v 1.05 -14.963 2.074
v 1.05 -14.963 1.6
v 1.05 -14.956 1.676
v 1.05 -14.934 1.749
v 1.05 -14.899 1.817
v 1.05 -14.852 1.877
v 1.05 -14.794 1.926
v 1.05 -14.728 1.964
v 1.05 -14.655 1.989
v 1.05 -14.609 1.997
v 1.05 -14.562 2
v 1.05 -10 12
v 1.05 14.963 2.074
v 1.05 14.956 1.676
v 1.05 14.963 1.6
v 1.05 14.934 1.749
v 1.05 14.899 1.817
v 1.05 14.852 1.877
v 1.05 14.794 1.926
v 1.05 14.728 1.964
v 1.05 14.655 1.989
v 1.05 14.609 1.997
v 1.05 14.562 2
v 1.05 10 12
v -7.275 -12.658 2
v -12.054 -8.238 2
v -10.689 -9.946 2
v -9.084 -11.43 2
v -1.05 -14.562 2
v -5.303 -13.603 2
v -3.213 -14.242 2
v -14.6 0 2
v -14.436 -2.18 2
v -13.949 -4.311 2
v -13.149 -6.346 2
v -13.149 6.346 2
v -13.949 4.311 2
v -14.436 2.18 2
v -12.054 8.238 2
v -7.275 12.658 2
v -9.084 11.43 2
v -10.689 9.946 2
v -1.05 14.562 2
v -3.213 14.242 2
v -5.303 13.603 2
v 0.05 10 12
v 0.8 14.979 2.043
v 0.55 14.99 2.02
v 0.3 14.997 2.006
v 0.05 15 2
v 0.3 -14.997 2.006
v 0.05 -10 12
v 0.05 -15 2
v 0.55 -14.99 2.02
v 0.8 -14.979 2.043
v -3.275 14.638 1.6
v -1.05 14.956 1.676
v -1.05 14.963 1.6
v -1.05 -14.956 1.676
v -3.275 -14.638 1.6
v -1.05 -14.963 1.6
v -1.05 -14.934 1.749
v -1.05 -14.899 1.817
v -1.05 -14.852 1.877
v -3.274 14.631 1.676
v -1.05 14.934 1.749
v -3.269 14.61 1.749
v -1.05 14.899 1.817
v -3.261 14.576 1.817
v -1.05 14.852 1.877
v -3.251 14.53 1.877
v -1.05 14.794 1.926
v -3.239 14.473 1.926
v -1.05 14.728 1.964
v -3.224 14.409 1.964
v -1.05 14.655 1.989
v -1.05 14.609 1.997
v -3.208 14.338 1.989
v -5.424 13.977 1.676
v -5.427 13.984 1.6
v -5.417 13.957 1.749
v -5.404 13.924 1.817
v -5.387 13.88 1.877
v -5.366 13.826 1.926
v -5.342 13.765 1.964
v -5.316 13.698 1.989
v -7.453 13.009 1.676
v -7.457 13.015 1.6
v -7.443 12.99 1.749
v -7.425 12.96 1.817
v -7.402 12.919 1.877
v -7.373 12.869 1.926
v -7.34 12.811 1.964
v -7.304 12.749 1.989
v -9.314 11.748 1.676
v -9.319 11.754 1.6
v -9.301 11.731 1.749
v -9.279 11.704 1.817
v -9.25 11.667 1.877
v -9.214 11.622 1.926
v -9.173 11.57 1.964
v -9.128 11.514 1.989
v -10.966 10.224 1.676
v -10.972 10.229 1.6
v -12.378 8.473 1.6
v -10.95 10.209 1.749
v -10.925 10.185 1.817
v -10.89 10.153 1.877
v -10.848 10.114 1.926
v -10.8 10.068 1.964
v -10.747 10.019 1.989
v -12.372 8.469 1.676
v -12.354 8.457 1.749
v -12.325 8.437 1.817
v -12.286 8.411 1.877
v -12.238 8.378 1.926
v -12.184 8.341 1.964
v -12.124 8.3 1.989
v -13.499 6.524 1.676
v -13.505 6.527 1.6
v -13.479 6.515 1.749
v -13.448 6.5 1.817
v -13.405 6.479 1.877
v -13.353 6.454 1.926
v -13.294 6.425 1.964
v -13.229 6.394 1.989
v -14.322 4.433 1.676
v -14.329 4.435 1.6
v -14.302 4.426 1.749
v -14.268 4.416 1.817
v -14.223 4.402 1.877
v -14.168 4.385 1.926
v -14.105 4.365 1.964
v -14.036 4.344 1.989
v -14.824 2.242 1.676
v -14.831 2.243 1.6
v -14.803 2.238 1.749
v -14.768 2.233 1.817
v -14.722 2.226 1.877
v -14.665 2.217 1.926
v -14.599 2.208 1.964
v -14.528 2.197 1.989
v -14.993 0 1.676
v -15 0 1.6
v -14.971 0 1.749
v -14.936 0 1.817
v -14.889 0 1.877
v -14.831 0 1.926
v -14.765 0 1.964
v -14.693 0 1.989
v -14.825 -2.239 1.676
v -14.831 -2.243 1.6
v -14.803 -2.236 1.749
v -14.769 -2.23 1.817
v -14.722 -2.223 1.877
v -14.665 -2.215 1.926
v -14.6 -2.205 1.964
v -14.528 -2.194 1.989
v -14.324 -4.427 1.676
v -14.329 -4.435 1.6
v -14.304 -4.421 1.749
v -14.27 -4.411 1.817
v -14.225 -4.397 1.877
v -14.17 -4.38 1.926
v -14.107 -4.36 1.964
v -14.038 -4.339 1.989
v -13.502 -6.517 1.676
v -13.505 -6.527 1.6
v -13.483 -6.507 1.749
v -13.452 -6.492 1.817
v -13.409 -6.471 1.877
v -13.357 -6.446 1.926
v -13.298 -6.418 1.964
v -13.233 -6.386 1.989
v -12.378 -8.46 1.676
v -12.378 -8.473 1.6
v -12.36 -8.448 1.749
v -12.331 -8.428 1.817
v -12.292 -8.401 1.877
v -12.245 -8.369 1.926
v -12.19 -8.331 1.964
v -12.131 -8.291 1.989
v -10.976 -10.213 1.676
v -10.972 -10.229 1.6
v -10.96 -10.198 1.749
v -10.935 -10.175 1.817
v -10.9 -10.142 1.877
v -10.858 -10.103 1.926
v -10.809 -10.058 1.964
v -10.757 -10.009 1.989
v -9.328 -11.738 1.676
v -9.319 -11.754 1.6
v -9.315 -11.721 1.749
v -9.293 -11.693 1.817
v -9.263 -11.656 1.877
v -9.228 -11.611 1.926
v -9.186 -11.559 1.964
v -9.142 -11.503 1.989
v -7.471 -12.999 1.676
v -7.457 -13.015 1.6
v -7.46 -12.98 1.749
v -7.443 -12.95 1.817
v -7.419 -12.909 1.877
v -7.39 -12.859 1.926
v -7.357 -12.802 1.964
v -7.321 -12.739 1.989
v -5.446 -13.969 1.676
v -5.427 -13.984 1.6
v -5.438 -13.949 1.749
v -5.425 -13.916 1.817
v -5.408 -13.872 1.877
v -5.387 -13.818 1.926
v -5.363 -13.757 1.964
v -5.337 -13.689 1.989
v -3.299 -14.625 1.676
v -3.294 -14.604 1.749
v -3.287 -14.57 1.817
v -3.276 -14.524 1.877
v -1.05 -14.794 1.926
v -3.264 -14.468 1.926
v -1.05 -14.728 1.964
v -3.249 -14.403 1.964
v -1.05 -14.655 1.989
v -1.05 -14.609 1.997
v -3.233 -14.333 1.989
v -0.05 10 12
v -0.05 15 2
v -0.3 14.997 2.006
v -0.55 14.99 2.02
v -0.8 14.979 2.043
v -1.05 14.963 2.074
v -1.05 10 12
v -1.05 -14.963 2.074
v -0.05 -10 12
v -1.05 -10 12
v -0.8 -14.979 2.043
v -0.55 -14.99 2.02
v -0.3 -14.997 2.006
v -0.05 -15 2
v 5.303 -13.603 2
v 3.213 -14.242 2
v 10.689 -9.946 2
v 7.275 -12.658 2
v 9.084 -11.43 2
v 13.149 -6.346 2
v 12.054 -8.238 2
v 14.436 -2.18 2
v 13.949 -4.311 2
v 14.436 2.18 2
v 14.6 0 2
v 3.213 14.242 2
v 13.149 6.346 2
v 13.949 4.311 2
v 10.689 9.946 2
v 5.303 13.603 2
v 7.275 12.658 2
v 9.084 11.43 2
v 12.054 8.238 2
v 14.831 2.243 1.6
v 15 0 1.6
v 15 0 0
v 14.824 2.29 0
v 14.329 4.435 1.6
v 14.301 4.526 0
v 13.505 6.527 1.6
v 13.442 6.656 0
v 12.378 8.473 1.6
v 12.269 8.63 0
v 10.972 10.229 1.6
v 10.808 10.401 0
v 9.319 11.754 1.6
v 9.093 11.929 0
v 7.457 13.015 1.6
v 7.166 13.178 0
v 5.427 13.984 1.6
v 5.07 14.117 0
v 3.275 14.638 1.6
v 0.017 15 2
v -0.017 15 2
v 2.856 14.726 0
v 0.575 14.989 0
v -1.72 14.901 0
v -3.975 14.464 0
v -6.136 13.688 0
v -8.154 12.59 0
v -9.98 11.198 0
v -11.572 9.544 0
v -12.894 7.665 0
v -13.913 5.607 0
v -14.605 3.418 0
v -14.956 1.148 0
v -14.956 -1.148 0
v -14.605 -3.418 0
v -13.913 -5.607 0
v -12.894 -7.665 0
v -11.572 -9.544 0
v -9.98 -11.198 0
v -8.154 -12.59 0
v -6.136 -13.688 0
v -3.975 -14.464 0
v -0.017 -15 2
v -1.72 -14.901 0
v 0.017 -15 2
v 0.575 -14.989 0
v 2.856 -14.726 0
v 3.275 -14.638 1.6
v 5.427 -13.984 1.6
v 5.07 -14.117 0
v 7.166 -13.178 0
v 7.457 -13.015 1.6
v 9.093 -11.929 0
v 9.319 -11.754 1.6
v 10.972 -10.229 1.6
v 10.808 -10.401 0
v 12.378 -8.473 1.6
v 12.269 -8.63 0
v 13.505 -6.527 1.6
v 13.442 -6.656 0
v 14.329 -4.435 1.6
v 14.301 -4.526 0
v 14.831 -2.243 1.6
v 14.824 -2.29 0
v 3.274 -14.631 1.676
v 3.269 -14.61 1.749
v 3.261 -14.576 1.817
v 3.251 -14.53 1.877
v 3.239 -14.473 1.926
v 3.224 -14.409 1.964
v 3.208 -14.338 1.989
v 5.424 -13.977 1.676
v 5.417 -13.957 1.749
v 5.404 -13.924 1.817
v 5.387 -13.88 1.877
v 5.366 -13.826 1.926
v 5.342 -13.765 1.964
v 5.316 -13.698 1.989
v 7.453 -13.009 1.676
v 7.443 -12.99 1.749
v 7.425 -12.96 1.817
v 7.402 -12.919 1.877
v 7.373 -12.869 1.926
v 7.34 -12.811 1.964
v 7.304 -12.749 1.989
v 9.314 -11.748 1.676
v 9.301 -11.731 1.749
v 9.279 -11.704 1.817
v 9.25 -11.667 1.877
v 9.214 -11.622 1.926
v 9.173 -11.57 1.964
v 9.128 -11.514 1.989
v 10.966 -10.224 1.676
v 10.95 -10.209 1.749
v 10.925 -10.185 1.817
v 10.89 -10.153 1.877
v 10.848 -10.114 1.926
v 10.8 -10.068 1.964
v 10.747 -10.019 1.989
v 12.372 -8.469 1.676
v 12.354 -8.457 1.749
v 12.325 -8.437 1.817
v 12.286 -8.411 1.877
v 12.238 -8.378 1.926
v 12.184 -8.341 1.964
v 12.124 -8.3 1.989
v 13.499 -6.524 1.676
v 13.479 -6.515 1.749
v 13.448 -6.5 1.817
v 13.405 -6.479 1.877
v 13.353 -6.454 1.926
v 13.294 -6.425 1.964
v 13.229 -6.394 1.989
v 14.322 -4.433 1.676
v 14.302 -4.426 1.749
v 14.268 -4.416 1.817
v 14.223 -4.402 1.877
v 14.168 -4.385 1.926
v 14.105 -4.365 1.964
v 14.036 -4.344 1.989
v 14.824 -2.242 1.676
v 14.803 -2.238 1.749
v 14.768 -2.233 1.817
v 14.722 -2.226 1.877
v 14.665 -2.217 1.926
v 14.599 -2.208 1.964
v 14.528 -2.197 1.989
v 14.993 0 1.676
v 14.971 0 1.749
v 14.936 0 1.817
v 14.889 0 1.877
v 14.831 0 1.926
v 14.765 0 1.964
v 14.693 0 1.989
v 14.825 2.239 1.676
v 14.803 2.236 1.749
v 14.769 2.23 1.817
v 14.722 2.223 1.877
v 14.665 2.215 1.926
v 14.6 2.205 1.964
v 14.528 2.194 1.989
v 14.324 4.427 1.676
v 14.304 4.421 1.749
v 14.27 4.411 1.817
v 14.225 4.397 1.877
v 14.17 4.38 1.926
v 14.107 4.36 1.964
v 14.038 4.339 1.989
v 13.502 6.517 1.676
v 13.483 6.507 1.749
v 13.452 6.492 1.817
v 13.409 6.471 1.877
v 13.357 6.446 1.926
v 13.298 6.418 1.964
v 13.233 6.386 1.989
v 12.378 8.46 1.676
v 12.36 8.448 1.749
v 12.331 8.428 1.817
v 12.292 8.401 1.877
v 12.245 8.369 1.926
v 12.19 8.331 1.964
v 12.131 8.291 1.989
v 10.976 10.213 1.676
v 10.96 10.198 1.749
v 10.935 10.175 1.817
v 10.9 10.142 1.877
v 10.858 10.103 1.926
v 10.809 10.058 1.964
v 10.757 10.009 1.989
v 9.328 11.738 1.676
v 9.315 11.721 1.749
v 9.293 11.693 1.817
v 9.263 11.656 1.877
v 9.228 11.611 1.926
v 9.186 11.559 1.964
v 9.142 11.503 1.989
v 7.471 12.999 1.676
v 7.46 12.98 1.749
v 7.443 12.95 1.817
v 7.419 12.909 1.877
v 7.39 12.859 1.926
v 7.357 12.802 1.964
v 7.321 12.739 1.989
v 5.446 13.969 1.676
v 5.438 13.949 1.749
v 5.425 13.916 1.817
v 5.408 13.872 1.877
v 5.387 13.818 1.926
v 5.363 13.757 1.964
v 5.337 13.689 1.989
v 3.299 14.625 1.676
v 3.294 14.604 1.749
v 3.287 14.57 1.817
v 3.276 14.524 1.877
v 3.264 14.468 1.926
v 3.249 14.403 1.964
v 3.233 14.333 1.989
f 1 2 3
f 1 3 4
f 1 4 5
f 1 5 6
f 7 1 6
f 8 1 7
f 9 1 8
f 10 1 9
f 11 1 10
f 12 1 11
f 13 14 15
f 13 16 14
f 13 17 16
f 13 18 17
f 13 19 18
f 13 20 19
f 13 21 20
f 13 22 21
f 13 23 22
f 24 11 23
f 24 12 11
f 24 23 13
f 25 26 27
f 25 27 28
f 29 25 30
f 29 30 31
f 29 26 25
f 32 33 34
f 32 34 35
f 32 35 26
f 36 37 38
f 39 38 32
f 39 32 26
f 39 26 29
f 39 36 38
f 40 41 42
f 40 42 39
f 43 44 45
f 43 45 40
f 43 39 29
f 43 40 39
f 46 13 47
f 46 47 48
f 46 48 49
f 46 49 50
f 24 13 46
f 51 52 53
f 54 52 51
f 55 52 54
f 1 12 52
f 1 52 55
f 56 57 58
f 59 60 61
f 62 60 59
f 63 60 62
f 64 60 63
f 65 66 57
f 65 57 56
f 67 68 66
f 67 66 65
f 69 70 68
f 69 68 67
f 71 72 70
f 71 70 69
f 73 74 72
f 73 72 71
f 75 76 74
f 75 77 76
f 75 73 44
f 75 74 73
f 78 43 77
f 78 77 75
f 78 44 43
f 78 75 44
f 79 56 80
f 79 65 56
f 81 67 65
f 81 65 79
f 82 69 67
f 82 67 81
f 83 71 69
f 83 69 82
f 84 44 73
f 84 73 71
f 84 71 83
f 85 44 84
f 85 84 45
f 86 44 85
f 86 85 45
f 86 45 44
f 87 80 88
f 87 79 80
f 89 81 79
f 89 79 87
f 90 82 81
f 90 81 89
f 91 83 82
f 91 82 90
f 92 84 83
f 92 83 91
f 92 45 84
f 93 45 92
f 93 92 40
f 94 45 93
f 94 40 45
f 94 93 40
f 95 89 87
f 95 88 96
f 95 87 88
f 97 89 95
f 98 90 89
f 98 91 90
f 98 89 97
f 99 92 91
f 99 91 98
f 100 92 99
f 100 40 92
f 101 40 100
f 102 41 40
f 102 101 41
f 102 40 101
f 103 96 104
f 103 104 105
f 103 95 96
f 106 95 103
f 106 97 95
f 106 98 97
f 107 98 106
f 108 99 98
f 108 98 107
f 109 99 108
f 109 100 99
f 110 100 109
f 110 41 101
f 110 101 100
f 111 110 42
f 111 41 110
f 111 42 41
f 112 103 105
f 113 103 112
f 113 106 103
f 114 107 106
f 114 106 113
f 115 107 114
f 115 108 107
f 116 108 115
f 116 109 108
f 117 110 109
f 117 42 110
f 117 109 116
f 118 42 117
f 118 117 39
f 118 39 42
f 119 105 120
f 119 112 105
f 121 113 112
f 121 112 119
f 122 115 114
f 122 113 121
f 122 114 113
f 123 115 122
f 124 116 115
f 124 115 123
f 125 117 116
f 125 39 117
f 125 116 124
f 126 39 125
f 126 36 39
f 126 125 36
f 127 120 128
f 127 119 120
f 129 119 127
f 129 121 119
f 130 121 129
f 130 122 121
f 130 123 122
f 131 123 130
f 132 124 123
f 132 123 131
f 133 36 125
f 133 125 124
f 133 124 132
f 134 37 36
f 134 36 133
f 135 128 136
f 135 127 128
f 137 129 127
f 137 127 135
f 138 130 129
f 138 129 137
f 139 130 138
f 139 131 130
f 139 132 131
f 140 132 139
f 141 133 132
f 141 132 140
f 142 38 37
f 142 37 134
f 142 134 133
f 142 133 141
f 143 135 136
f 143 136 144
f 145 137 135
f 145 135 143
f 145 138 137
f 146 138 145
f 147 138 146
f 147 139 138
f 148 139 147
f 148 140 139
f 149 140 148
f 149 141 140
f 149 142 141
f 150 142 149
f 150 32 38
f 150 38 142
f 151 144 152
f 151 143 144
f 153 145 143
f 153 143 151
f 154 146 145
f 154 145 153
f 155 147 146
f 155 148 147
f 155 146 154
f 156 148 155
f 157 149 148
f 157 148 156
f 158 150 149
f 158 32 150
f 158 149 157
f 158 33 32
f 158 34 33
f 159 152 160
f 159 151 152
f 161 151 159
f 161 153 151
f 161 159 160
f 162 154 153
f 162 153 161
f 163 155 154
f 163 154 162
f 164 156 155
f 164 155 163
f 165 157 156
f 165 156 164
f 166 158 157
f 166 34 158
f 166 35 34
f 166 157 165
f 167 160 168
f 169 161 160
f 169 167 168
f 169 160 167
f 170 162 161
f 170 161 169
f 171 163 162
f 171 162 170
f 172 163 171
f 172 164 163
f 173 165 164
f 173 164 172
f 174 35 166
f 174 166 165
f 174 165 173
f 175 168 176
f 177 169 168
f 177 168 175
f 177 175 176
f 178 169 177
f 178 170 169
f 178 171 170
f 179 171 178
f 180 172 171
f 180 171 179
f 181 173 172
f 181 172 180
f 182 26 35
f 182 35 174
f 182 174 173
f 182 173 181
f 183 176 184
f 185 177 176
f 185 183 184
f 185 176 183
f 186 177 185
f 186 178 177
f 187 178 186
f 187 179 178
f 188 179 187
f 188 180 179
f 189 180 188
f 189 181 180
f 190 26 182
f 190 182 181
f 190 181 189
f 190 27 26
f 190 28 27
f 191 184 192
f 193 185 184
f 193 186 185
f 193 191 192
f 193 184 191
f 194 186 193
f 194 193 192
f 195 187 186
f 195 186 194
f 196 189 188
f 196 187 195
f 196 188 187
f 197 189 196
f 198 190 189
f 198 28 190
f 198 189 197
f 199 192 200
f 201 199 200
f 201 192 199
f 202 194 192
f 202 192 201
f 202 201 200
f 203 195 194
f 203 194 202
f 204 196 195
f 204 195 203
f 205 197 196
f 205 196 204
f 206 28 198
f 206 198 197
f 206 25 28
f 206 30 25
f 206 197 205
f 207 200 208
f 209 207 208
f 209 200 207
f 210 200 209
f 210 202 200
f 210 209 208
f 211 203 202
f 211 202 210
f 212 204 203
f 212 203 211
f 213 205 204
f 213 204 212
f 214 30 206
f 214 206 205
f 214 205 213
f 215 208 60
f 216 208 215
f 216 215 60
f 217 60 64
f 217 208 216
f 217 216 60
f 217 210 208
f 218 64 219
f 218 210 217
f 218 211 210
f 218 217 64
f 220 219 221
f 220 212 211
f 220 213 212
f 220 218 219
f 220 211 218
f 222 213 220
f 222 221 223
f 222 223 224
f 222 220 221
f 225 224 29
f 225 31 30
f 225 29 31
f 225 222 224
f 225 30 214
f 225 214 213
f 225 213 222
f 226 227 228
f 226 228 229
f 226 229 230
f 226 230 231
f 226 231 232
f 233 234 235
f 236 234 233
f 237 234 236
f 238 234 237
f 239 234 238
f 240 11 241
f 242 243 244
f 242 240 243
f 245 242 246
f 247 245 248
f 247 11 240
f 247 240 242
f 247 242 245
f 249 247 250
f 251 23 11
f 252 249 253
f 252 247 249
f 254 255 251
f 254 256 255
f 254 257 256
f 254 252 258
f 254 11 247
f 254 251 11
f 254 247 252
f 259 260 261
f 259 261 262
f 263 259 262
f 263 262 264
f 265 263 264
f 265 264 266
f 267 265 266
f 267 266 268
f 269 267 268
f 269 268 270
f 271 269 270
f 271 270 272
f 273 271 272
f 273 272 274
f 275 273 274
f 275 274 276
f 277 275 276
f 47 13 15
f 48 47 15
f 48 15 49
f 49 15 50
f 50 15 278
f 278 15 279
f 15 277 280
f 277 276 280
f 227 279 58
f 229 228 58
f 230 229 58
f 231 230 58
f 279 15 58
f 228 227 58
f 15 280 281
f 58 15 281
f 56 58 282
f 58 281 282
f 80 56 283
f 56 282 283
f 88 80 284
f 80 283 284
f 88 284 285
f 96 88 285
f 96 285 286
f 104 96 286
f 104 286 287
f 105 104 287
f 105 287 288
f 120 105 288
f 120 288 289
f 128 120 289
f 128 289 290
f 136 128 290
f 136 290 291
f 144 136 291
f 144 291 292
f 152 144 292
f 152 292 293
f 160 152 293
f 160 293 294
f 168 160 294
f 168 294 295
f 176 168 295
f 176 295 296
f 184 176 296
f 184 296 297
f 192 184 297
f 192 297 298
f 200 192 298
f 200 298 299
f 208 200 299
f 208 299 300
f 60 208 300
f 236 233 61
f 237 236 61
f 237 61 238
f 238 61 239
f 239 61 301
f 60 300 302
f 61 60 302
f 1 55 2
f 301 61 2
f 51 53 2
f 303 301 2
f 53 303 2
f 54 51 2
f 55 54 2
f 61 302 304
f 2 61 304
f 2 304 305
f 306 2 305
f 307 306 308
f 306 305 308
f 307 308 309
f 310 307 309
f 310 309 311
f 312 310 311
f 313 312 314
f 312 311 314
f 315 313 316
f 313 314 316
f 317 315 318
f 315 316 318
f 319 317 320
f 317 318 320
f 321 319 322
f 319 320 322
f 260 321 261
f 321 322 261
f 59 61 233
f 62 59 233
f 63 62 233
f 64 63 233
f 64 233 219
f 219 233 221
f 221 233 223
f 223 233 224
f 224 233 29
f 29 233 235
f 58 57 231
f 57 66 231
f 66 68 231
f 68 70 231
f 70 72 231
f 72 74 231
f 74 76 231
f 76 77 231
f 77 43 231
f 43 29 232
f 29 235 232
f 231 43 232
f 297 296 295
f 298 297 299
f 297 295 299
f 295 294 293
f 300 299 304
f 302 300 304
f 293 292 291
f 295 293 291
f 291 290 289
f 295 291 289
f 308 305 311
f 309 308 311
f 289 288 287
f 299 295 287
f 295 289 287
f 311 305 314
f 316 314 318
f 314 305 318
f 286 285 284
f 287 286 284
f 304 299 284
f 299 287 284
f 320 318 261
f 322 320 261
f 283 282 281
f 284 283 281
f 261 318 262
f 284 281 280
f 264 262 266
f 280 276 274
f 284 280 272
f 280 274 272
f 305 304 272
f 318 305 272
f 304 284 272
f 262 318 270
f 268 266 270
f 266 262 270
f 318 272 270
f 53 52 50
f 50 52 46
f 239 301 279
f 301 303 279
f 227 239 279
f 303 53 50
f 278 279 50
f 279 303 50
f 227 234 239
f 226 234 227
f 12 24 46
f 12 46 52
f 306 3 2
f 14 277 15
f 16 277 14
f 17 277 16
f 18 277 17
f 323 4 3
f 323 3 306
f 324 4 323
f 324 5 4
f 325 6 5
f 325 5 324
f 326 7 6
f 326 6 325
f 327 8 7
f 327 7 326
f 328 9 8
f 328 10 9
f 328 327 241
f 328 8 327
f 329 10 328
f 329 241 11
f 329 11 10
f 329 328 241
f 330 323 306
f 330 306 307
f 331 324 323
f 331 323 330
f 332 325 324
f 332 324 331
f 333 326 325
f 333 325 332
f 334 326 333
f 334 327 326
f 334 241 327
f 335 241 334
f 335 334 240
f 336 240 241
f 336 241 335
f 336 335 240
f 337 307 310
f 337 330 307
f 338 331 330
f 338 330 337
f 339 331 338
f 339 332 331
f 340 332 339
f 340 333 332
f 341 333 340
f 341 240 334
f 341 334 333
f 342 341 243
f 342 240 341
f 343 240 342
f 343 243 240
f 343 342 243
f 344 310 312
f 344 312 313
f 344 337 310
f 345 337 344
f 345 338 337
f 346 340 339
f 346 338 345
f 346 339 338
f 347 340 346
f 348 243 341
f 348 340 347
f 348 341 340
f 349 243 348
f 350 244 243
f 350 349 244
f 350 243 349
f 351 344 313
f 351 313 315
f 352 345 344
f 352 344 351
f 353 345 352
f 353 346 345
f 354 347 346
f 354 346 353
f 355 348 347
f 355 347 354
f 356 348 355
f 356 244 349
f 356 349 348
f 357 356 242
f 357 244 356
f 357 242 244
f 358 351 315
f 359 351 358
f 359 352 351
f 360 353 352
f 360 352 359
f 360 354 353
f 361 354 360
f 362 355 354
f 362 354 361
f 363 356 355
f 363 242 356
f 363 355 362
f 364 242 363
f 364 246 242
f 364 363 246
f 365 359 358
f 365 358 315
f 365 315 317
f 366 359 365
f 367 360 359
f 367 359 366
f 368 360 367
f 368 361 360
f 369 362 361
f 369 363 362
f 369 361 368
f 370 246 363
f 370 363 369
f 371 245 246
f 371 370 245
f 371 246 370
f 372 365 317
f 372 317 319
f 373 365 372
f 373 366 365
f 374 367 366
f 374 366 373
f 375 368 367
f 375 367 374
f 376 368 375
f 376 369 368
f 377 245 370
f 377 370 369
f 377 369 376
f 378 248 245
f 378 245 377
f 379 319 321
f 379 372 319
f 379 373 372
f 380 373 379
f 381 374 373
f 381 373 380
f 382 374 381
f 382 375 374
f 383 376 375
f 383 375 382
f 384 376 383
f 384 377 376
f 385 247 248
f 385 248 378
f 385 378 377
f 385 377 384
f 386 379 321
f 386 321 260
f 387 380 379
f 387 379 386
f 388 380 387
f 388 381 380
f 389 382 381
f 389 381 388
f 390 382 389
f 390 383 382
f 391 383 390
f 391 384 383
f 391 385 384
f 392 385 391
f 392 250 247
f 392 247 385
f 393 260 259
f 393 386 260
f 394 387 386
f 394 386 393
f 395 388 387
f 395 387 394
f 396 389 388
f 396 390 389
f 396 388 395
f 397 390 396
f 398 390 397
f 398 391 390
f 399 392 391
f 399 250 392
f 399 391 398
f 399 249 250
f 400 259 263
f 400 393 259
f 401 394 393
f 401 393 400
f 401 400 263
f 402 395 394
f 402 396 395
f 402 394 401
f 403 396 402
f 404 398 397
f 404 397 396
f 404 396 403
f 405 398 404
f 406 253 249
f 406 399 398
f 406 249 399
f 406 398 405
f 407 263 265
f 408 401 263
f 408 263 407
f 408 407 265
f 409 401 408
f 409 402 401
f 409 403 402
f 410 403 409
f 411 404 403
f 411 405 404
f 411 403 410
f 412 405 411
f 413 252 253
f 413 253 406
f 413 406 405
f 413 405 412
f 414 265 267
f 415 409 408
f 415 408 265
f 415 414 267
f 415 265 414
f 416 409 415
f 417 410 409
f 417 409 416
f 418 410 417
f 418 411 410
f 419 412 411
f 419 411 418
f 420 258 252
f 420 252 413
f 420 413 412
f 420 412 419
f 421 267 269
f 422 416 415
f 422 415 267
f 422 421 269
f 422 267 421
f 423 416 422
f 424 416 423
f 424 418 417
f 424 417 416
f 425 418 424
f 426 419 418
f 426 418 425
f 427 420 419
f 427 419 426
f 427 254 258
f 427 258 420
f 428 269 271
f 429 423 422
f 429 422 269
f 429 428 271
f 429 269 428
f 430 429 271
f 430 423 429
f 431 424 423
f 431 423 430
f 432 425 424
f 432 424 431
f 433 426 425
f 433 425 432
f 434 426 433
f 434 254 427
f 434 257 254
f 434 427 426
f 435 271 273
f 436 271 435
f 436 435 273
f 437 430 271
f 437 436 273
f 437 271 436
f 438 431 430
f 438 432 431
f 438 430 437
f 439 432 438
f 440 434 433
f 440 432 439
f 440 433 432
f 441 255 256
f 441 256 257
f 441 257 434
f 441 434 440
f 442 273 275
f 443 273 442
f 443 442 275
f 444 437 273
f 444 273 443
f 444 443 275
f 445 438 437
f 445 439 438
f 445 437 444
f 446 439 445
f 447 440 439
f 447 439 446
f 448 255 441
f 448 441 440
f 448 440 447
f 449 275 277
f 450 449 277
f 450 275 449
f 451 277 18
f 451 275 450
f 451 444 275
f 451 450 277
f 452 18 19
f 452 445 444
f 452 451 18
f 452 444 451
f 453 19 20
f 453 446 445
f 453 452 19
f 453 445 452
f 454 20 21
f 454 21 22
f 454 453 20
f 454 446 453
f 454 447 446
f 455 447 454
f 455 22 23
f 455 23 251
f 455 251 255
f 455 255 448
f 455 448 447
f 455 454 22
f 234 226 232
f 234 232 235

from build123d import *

# Parameters (mm, degrees)
F0_R     = 15
F1_DEPTH = 2
F3_DEPTH = 1.05
F4_DEPTH = 0.05
F5_F1_R  = 0.4
F5_F2_R  = 0.4
F0_R_2   = 19.9891271991
F6_DEPTH = 50


with BuildPart() as f1:
    # F0 (on Top) → F1 (new body)
    with BuildSketch(Plane.XY):
        Circle(F0_R)
    extrude(amount=F1_DEPTH)

    # F2 (on Right) → F3 (join, symmetric)
    with BuildSketch(Plane.YZ):
        Polygon((-10, 12), (-15, 2), (15, 2), (10, 12), align=None)
    extrude(amount=F3_DEPTH, both=True)

    # F2 (on Right) → F4 (cut, symmetric)
    with BuildSketch(Plane.YZ):
        Polygon((-10, 12), (-15, 2), (15, 2), (10, 12), align=None)
    extrude(amount=F4_DEPTH, both=True, mode=Mode.SUBTRACT)

    # F5: fillet of radius 0.4 on 3 edges, made by hand

    # F5_f1
    f5_f1_edges = [f1.edges().sort_by_distance(p)[0] for p in [
        (-15, 0, 2),
    ]]
    fillet(f5_f1_edges, radius=F5_F1_R)

    # F5_f2
    f5_f2_edges = [f1.edges().sort_by_distance(p)[0] for p in [
        (10.9715541287, 10.2286362727, 2),
        (10.9715541287, -10.2286362727, 2),
    ]]
    fillet(f5_f2_edges, radius=F5_F2_R)

    # F0 (on Top) → F6 (cut)
    with BuildSketch(Plane.XY):
        Circle(F0_R_2)
        Circle(F0_R, mode=Mode.SUBTRACT)
    extrude(amount=F6_DEPTH, mode=Mode.SUBTRACT)


solid = f1.part
